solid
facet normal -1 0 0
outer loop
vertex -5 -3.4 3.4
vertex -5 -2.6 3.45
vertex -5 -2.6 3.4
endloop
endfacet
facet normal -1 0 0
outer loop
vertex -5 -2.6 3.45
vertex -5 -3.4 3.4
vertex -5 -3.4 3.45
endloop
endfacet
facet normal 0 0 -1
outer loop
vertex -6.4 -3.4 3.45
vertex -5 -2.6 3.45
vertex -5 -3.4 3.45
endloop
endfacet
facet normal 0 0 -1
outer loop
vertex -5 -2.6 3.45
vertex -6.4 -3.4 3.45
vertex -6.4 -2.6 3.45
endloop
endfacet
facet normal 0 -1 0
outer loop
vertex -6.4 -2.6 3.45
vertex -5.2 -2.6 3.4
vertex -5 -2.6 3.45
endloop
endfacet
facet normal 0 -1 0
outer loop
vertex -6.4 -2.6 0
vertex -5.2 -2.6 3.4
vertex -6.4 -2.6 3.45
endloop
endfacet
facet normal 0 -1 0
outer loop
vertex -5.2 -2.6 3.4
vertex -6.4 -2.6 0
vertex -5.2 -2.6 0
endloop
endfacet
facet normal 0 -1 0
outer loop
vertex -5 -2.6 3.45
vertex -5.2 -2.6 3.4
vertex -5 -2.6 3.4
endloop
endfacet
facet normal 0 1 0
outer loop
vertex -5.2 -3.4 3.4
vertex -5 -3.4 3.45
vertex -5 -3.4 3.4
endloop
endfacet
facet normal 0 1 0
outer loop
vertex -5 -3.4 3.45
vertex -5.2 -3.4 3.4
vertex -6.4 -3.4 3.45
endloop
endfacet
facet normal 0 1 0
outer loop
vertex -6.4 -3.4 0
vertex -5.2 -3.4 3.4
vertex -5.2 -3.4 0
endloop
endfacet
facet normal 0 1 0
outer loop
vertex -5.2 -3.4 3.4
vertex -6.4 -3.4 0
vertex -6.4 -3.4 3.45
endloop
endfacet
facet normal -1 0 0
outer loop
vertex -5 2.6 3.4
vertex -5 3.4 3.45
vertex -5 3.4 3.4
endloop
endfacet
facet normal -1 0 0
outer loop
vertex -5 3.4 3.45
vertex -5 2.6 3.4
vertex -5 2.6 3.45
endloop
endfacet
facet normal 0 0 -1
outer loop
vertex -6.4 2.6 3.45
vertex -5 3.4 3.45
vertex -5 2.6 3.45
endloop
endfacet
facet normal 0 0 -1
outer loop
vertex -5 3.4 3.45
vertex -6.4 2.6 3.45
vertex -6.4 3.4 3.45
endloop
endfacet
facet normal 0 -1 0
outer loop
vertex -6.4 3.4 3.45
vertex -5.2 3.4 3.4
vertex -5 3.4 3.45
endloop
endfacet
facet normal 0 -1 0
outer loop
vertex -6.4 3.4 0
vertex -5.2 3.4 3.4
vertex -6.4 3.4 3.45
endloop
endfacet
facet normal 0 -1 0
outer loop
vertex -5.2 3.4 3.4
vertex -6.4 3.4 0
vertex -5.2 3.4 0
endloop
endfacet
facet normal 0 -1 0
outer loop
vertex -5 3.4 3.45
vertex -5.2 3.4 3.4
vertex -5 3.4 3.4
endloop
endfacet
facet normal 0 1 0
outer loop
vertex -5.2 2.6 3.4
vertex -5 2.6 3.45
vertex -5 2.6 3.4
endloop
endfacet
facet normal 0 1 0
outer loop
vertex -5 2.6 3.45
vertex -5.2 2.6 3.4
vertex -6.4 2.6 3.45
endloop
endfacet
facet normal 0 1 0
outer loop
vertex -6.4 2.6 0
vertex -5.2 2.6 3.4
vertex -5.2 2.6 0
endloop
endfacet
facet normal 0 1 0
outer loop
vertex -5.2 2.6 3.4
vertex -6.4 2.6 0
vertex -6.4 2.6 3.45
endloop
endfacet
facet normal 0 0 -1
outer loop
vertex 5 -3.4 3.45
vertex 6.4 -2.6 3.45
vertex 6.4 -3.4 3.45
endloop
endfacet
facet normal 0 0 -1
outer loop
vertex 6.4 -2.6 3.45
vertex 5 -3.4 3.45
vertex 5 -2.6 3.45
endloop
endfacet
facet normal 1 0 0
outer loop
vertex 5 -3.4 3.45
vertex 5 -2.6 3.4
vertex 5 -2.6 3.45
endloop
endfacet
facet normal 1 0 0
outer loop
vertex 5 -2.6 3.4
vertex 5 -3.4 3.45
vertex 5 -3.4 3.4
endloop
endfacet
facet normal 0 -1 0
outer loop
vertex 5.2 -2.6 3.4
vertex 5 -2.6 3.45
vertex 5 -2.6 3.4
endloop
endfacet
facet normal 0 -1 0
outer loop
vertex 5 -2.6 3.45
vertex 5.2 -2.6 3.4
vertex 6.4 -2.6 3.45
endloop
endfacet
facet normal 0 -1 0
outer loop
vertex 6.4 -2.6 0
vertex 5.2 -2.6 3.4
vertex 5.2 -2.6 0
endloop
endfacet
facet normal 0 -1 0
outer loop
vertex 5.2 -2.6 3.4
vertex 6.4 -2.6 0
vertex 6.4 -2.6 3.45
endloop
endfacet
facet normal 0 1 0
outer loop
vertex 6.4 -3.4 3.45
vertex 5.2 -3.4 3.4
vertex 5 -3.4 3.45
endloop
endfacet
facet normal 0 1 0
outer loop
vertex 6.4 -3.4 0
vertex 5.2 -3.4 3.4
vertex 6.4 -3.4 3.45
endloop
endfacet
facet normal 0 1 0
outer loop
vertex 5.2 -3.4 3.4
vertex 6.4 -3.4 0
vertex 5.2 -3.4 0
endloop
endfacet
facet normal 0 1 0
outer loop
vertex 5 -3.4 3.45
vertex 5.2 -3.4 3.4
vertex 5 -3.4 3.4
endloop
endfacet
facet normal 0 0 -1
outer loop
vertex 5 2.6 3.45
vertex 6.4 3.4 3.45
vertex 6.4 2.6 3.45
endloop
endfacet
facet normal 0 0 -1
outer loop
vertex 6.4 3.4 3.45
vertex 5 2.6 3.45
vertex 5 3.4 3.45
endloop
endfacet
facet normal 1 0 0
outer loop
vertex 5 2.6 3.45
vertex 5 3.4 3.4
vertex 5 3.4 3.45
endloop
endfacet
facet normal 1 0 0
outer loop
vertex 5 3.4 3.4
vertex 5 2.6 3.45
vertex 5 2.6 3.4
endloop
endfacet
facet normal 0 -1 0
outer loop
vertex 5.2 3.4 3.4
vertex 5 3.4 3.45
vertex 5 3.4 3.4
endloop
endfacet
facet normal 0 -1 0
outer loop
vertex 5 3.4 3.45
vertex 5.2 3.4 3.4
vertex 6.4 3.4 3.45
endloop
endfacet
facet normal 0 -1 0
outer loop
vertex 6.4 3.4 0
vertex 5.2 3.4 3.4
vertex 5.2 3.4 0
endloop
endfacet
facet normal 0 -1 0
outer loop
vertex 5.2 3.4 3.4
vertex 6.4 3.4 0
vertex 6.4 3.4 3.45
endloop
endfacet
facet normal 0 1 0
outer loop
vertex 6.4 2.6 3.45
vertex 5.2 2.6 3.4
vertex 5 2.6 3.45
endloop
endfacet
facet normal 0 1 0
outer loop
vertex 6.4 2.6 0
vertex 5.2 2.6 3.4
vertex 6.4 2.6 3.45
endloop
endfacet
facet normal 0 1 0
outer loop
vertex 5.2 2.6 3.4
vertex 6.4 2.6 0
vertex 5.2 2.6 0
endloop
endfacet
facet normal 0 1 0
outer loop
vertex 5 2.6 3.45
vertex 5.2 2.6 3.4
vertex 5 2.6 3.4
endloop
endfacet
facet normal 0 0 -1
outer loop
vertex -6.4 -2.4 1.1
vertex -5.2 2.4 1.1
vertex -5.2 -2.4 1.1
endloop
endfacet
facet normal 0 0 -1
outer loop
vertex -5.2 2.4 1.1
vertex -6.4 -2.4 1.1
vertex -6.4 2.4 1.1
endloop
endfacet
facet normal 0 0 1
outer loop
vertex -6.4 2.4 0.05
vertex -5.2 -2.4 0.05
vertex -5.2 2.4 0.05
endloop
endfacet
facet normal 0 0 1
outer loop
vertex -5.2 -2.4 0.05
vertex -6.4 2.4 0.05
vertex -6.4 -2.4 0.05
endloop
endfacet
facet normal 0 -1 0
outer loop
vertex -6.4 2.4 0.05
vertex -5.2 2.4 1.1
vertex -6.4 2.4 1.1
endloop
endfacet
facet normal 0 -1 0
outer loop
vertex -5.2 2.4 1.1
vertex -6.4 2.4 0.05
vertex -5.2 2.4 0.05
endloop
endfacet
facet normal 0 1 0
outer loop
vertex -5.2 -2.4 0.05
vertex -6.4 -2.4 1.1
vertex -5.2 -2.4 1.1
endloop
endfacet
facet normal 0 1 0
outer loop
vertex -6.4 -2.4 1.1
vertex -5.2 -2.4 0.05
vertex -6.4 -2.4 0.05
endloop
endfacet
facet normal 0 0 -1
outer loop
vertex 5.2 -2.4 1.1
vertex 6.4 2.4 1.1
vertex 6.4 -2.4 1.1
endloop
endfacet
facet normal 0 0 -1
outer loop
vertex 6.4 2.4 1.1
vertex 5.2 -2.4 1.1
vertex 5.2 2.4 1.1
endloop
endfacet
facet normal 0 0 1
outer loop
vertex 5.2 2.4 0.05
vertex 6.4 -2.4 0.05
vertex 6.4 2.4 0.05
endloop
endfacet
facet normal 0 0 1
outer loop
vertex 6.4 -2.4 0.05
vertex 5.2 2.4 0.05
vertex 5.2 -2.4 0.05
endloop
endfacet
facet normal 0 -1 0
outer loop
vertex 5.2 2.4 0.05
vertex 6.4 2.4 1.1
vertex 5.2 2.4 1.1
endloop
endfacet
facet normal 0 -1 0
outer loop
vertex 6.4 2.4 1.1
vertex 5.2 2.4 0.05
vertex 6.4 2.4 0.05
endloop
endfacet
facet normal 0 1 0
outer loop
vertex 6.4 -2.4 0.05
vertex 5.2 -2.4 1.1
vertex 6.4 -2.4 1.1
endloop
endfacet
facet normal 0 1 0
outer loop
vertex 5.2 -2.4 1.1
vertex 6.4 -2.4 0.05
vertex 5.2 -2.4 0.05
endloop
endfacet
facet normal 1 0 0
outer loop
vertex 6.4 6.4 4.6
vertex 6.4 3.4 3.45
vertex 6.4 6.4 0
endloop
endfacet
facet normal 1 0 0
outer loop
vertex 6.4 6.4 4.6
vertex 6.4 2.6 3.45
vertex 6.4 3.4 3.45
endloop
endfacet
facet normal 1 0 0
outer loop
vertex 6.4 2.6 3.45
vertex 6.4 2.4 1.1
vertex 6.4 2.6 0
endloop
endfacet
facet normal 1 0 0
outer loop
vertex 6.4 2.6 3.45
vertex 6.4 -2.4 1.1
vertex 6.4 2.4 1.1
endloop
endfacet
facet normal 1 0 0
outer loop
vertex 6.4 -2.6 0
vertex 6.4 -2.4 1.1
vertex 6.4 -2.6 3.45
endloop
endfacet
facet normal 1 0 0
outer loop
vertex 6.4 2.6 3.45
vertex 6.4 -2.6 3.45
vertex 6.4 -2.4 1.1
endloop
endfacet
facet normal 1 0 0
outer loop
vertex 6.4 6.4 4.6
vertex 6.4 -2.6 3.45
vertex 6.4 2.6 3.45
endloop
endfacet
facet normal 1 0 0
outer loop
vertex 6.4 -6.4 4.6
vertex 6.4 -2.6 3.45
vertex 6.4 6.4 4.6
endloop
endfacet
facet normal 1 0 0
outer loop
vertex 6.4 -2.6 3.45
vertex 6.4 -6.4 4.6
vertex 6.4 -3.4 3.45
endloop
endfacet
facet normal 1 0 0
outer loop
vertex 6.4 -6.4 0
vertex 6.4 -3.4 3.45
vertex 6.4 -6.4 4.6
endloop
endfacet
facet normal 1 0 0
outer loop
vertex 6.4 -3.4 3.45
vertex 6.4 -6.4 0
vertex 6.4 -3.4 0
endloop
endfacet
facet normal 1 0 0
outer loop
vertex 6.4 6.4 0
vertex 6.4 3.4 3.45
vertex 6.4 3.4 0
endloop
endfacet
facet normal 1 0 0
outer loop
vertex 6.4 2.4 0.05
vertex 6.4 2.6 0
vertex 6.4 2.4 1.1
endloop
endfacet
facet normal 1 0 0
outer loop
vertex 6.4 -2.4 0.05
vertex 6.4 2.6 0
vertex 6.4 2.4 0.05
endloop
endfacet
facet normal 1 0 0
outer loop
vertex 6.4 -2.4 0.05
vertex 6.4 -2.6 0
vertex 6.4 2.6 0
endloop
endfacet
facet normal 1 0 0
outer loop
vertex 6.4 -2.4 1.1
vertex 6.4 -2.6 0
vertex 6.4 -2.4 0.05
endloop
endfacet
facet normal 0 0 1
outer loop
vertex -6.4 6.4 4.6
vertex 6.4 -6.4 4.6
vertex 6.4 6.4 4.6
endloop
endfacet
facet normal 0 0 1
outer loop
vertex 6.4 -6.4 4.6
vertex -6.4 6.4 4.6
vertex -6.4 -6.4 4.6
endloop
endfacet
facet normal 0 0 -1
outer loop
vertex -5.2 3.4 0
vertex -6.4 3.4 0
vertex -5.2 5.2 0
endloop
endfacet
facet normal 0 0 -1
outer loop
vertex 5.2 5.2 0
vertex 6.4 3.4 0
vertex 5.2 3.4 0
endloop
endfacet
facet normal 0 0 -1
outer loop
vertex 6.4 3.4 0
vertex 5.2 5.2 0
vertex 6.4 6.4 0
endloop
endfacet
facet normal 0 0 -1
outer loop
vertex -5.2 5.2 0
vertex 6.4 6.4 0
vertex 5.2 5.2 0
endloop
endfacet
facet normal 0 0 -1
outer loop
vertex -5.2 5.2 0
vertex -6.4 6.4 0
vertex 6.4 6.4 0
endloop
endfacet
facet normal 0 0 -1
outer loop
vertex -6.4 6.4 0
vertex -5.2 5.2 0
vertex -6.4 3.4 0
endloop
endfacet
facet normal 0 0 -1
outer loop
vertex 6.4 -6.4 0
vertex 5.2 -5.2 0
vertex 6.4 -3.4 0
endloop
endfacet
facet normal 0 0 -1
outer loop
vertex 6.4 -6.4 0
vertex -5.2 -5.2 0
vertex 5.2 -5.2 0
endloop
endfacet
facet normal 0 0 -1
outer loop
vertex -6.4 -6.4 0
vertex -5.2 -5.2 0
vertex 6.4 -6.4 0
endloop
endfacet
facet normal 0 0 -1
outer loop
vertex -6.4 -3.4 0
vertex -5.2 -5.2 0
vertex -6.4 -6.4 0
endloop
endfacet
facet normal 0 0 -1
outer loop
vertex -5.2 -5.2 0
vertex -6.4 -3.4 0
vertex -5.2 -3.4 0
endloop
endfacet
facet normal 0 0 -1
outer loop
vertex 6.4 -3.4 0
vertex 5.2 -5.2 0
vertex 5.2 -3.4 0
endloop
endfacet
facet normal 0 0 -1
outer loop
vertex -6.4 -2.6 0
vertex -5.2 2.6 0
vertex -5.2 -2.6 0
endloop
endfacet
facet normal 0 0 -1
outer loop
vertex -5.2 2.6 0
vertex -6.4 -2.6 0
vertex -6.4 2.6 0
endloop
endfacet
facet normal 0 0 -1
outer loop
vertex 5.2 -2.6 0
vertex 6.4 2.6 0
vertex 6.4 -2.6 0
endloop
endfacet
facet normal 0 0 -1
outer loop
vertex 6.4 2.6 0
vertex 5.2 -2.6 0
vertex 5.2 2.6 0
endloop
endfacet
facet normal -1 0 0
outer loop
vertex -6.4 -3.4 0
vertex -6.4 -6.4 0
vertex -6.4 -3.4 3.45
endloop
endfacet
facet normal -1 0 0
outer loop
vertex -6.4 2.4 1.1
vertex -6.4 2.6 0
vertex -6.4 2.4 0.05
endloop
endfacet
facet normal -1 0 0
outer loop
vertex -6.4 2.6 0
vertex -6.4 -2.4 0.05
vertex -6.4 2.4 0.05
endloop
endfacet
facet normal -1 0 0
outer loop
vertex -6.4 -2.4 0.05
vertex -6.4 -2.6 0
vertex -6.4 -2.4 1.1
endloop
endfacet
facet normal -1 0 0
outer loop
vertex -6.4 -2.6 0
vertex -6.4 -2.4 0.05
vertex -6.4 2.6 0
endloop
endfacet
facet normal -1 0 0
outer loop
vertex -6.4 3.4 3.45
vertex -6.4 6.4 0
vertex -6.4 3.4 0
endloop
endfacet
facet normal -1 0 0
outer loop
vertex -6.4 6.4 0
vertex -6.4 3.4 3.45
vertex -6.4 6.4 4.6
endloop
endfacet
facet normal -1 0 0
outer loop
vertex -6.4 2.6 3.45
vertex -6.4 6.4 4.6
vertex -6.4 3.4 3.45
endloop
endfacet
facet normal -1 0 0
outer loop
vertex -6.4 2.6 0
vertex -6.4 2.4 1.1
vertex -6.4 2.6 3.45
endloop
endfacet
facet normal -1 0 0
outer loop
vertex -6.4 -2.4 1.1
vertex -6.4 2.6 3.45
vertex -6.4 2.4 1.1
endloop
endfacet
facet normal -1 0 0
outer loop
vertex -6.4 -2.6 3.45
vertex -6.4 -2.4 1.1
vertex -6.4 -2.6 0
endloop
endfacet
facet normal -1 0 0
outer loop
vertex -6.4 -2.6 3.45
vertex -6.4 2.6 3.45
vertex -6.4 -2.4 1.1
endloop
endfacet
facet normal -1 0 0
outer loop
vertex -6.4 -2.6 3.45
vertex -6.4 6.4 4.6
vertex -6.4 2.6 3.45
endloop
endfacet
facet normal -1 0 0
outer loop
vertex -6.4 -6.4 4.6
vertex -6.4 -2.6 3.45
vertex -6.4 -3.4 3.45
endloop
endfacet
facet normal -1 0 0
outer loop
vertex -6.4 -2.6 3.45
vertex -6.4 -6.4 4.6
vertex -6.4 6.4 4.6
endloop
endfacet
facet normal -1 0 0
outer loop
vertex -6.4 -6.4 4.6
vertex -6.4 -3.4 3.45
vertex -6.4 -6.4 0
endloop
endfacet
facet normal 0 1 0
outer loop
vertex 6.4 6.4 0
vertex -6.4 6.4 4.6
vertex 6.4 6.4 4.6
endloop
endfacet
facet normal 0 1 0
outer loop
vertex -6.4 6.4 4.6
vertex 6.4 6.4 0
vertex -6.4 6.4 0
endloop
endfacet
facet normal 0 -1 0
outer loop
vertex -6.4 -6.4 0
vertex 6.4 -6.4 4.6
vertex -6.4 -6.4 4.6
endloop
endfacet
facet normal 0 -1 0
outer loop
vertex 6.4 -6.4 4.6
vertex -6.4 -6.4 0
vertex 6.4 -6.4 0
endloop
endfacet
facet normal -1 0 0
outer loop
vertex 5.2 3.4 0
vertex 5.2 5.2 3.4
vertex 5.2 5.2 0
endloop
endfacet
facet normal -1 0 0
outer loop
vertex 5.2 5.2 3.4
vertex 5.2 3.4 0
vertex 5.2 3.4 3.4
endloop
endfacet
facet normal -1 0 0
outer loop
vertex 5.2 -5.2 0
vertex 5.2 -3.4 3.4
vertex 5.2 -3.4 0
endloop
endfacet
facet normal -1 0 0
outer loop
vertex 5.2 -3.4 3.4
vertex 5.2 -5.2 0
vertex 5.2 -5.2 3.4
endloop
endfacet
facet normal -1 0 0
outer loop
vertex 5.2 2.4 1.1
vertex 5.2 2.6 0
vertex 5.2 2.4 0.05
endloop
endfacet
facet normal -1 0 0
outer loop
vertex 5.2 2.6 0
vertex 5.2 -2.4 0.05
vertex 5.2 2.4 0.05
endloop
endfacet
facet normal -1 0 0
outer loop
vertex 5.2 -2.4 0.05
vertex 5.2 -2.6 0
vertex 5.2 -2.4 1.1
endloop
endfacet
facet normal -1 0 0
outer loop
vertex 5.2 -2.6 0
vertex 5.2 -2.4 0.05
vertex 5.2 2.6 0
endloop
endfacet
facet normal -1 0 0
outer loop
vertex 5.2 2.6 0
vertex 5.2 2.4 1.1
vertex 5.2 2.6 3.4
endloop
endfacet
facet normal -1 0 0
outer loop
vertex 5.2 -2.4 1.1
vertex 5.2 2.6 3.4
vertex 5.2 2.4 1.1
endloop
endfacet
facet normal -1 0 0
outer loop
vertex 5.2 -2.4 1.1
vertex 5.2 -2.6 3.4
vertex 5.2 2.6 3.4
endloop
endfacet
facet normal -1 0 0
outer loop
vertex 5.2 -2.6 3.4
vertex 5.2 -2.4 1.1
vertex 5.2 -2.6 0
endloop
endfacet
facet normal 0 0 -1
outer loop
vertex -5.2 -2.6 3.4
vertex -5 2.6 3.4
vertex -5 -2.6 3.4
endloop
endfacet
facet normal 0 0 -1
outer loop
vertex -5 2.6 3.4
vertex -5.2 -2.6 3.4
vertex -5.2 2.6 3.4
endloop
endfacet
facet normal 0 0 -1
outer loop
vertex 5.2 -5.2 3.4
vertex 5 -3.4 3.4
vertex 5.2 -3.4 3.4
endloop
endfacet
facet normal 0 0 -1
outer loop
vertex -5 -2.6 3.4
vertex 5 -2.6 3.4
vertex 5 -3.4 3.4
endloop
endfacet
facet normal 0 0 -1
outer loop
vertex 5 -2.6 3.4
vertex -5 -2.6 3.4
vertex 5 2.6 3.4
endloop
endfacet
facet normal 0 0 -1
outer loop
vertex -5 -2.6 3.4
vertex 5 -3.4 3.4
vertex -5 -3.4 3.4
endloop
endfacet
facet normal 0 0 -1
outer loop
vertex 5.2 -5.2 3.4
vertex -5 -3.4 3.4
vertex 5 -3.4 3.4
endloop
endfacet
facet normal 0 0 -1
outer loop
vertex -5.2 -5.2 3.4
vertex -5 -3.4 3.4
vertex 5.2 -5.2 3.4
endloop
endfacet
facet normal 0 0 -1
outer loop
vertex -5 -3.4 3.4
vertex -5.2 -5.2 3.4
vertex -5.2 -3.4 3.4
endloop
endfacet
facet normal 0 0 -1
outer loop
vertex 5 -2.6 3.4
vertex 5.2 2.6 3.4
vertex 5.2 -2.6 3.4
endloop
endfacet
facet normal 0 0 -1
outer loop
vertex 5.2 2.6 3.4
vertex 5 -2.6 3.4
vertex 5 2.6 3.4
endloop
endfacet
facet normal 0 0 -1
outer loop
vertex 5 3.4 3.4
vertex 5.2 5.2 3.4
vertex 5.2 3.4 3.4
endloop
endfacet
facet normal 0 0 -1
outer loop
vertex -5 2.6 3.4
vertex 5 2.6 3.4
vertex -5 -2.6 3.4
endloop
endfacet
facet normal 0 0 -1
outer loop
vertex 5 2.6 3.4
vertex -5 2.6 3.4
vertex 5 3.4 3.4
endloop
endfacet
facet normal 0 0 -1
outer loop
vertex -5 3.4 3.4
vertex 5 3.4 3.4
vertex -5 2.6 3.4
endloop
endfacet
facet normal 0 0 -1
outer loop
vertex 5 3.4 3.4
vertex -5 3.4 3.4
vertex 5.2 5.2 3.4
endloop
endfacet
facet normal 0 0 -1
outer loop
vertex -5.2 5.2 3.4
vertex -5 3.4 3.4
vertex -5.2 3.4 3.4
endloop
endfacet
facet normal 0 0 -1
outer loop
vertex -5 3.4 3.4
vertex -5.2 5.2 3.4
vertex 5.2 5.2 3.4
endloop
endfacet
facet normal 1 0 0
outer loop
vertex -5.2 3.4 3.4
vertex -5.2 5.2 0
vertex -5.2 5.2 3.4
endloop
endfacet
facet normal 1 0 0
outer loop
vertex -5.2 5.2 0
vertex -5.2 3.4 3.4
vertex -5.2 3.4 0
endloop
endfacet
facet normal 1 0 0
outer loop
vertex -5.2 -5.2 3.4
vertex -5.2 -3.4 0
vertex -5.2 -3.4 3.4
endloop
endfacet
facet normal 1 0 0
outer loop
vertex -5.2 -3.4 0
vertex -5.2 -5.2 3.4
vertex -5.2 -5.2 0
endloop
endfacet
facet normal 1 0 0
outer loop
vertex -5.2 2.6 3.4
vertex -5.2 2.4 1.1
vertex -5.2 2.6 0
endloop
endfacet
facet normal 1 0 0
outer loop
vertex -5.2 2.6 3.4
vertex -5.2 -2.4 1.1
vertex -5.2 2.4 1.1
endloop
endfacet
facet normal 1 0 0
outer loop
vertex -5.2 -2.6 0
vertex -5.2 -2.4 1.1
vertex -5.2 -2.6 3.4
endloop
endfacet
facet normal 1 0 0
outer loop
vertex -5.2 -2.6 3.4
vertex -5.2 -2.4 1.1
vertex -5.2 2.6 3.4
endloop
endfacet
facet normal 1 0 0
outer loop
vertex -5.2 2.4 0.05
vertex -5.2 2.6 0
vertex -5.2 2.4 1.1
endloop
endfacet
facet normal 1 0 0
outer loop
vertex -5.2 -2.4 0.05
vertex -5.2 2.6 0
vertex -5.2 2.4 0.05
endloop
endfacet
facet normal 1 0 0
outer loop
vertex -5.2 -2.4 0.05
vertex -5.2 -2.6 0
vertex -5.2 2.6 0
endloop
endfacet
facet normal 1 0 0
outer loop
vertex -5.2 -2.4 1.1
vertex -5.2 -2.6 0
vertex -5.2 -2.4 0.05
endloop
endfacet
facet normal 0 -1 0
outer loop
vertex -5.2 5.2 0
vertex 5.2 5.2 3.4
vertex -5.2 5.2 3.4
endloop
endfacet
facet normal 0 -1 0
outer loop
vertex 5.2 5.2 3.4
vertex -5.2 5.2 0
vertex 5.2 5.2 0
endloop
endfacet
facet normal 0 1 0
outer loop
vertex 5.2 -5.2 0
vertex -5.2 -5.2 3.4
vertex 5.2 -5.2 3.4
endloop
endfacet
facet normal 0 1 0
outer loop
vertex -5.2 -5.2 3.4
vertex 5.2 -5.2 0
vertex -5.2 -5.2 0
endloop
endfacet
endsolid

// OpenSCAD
// file: ../lib/at01_inverted_core_snap.scad
// File: at01_inverted_core_snap.scad
// AT-01 — experiment-owned inverted fixed-core / removable-shell snap.
//
// This geometry does not copy the QuackWorks/OpenGrid snap. It keeps only the
// high-level design lessons: compact fixed side, removable compliant side,
// explicit locating/retention roles, and a Lite-like 4.0 / 3.4 mm Z baseline.

// Fixed-side baseline.
AT01_CORE_SIZE = 10.0;
AT01_CORE_HEIGHT = 4.0;
AT01_ROOT_SHOULDER = 0.6;
AT01_ENGAGEMENT_HEIGHT = 3.4;

// Removable shell.
AT01_CLEARANCE = 0.20;              // per side on nominal 10 x 10 core
AT01_SHELL_WALL = 1.20;
AT01_SHELL_TOP = 1.20;
AT01_SHELL_INNER = AT01_CORE_SIZE + 2 * AT01_CLEARANCE;
AT01_SHELL_OUTER = AT01_SHELL_INNER + 2 * AT01_SHELL_WALL;
AT01_SHELL_HEIGHT = AT01_ENGAGEMENT_HEIGHT + AT01_SHELL_TOP;

// Two-sided retention on +/-X.
AT01_RIB_PROTRUSION = 0.35;
AT01_RIB_WIDTH = 4.0;
AT01_RIB_Z_BOTTOM = 0.75;
AT01_RIB_Z_LOWER_MAX = 0.95;
AT01_RIB_Z_UPPER_MAX = 1.15;
AT01_RIB_Z_TOP = 1.60;

// Receiving window in each compliant shell tongue.
// Values are shell-local; assembled shell starts at Z=AT01_ROOT_SHOULDER.
AT01_WINDOW_WIDTH = 4.8;
AT01_WINDOW_Z_MIN = 0.05;
AT01_WINDOW_Z_MAX = 1.10;

// Two relief slots isolate the center tongue on each +/-X wall.
AT01_FLEX_SLOT_Y = 3.0;
AT01_FLEX_SLOT_WIDTH = 0.8;

// Evidence helpers.
AT01_EXPLODED_Z = 8.0;
AT01_PROFILE_SLICE = 1.0;

assert(
    abs(AT01_ROOT_SHOULDER + AT01_ENGAGEMENT_HEIGHT - AT01_CORE_HEIGHT) < 0.0001,
    "AT-01 Lite baseline must satisfy shoulder + engagement = 4.0 mm."
);
assert(
    abs(AT01_SHELL_INNER - (AT01_CORE_SIZE + 2 * AT01_CLEARANCE)) < 0.0001,
    "AT-01 shell inner size must preserve the stated side clearance."
);

module _at01_positive_x_retention_rib() {
    // Polygon is defined in X/Z and extruded along Y.
    rotate([90, 0, 0])
        linear_extrude(height = AT01_RIB_WIDTH, center = true, convexity = 10)
            polygon(points = [
                [AT01_CORE_SIZE / 2, AT01_RIB_Z_BOTTOM],
                [AT01_CORE_SIZE / 2 + AT01_RIB_PROTRUSION, AT01_RIB_Z_LOWER_MAX],
                [AT01_CORE_SIZE / 2 + AT01_RIB_PROTRUSION, AT01_RIB_Z_UPPER_MAX],
                [AT01_CORE_SIZE / 2, AT01_RIB_Z_TOP]
            ]);
}

module at01_fixed_core() {
    union() {
        translate([-AT01_CORE_SIZE / 2, -AT01_CORE_SIZE / 2, 0])
            cube([AT01_CORE_SIZE, AT01_CORE_SIZE, AT01_CORE_HEIGHT]);

        _at01_positive_x_retention_rib();

        mirror([1, 0, 0])
            _at01_positive_x_retention_rib();
    }
}

module _at01_shell_outer() {
    translate([-AT01_SHELL_OUTER / 2, -AT01_SHELL_OUTER / 2, 0])
        cube([AT01_SHELL_OUTER, AT01_SHELL_OUTER, AT01_SHELL_HEIGHT]);
}

module _at01_shell_cavity() {
    // Ends exactly at the underside of the top plate.
    translate([-AT01_SHELL_INNER / 2, -AT01_SHELL_INNER / 2, -0.05])
        cube([AT01_SHELL_INNER, AT01_SHELL_INNER, AT01_ENGAGEMENT_HEIGHT + 0.05]);
}

module _at01_retention_window(x_sign = 1) {
    wall_center = (AT01_SHELL_INNER / 2 + AT01_SHELL_OUTER / 2) / 2;
    translate([
        x_sign * wall_center,
        0,
        (AT01_WINDOW_Z_MIN + AT01_WINDOW_Z_MAX) / 2
    ])
        cube([
            AT01_SHELL_WALL + 0.4,
            AT01_WINDOW_WIDTH,
            AT01_WINDOW_Z_MAX - AT01_WINDOW_Z_MIN
        ], center = true);
}

module _at01_flex_slot(x_sign = 1, y_sign = 1) {
    wall_center = (AT01_SHELL_INNER / 2 + AT01_SHELL_OUTER / 2) / 2;
    translate([
        x_sign * wall_center,
        y_sign * AT01_FLEX_SLOT_Y,
        AT01_ENGAGEMENT_HEIGHT / 2
    ])
        cube([
            AT01_SHELL_WALL + 0.4,
            AT01_FLEX_SLOT_WIDTH,
            AT01_ENGAGEMENT_HEIGHT + 0.10
        ], center = true);
}

module at01_removable_shell() {
    difference() {
        _at01_shell_outer();
        _at01_shell_cavity();

        for (x_sign = [-1, 1]) {
            _at01_retention_window(x_sign);

            for (y_sign = [-1, 1])
                _at01_flex_slot(x_sign, y_sign);
        }
    }
}

module at01_assembled(shell_alpha = 0.55) {
    color([0.68, 0.70, 0.74])
        at01_fixed_core();

    translate([0, 0, AT01_ROOT_SHOULDER])
        color([0.92, 0.30, 0.12, shell_alpha])
            at01_removable_shell();
}

module at01_exploded() {
    color([0.68, 0.70, 0.74])
        at01_fixed_core();

    translate([0, 0, AT01_ROOT_SHOULDER + AT01_EXPLODED_Z])
        color([0.92, 0.30, 0.12])
            at01_removable_shell();
}

module _at01_retention_slice_volume() {
    translate([-20, -AT01_PROFILE_SLICE / 2, -1])
        cube([40, AT01_PROFILE_SLICE, 12]);
}

module _at01_locating_slice_volume() {
    translate([-AT01_PROFILE_SLICE / 2, -20, -1])
        cube([AT01_PROFILE_SLICE, 40, 12]);
}

module at01_fixed_retention_profile() {
    intersection() {
        at01_fixed_core();
        _at01_retention_slice_volume();
    }
}

module at01_shell_retention_profile() {
    intersection() {
        at01_removable_shell();
        translate([0, 0, -AT01_ROOT_SHOULDER])
            _at01_retention_slice_volume();
    }
}

module at01_fixed_locating_profile() {
    intersection() {
        at01_fixed_core();
        _at01_locating_slice_volume();
    }
}

module at01_shell_locating_profile() {
    intersection() {
        at01_removable_shell();
        translate([0, 0, -AT01_ROOT_SHOULDER])
            _at01_locating_slice_volume();
    }
}

module at01_retention_section() {
    color([0.68, 0.70, 0.74])
        at01_fixed_retention_profile();

    translate([0, 0, AT01_ROOT_SHOULDER])
        color([0.92, 0.30, 0.12])
            at01_shell_retention_profile();
}

module at01_locating_section() {
    color([0.68, 0.70, 0.74])
        at01_fixed_locating_profile();

    translate([0, 0, AT01_ROOT_SHOULDER])
        color([0.92, 0.30, 0.12])
            at01_shell_locating_profile();
}
// main file
include <../lib/at01_inverted_core_snap.scad>
$vpt=[0,0,2.3]; $vpr=[68,0,35]; $vpd=46;
color([0.92,0.30,0.12]) at01_removable_shell();
